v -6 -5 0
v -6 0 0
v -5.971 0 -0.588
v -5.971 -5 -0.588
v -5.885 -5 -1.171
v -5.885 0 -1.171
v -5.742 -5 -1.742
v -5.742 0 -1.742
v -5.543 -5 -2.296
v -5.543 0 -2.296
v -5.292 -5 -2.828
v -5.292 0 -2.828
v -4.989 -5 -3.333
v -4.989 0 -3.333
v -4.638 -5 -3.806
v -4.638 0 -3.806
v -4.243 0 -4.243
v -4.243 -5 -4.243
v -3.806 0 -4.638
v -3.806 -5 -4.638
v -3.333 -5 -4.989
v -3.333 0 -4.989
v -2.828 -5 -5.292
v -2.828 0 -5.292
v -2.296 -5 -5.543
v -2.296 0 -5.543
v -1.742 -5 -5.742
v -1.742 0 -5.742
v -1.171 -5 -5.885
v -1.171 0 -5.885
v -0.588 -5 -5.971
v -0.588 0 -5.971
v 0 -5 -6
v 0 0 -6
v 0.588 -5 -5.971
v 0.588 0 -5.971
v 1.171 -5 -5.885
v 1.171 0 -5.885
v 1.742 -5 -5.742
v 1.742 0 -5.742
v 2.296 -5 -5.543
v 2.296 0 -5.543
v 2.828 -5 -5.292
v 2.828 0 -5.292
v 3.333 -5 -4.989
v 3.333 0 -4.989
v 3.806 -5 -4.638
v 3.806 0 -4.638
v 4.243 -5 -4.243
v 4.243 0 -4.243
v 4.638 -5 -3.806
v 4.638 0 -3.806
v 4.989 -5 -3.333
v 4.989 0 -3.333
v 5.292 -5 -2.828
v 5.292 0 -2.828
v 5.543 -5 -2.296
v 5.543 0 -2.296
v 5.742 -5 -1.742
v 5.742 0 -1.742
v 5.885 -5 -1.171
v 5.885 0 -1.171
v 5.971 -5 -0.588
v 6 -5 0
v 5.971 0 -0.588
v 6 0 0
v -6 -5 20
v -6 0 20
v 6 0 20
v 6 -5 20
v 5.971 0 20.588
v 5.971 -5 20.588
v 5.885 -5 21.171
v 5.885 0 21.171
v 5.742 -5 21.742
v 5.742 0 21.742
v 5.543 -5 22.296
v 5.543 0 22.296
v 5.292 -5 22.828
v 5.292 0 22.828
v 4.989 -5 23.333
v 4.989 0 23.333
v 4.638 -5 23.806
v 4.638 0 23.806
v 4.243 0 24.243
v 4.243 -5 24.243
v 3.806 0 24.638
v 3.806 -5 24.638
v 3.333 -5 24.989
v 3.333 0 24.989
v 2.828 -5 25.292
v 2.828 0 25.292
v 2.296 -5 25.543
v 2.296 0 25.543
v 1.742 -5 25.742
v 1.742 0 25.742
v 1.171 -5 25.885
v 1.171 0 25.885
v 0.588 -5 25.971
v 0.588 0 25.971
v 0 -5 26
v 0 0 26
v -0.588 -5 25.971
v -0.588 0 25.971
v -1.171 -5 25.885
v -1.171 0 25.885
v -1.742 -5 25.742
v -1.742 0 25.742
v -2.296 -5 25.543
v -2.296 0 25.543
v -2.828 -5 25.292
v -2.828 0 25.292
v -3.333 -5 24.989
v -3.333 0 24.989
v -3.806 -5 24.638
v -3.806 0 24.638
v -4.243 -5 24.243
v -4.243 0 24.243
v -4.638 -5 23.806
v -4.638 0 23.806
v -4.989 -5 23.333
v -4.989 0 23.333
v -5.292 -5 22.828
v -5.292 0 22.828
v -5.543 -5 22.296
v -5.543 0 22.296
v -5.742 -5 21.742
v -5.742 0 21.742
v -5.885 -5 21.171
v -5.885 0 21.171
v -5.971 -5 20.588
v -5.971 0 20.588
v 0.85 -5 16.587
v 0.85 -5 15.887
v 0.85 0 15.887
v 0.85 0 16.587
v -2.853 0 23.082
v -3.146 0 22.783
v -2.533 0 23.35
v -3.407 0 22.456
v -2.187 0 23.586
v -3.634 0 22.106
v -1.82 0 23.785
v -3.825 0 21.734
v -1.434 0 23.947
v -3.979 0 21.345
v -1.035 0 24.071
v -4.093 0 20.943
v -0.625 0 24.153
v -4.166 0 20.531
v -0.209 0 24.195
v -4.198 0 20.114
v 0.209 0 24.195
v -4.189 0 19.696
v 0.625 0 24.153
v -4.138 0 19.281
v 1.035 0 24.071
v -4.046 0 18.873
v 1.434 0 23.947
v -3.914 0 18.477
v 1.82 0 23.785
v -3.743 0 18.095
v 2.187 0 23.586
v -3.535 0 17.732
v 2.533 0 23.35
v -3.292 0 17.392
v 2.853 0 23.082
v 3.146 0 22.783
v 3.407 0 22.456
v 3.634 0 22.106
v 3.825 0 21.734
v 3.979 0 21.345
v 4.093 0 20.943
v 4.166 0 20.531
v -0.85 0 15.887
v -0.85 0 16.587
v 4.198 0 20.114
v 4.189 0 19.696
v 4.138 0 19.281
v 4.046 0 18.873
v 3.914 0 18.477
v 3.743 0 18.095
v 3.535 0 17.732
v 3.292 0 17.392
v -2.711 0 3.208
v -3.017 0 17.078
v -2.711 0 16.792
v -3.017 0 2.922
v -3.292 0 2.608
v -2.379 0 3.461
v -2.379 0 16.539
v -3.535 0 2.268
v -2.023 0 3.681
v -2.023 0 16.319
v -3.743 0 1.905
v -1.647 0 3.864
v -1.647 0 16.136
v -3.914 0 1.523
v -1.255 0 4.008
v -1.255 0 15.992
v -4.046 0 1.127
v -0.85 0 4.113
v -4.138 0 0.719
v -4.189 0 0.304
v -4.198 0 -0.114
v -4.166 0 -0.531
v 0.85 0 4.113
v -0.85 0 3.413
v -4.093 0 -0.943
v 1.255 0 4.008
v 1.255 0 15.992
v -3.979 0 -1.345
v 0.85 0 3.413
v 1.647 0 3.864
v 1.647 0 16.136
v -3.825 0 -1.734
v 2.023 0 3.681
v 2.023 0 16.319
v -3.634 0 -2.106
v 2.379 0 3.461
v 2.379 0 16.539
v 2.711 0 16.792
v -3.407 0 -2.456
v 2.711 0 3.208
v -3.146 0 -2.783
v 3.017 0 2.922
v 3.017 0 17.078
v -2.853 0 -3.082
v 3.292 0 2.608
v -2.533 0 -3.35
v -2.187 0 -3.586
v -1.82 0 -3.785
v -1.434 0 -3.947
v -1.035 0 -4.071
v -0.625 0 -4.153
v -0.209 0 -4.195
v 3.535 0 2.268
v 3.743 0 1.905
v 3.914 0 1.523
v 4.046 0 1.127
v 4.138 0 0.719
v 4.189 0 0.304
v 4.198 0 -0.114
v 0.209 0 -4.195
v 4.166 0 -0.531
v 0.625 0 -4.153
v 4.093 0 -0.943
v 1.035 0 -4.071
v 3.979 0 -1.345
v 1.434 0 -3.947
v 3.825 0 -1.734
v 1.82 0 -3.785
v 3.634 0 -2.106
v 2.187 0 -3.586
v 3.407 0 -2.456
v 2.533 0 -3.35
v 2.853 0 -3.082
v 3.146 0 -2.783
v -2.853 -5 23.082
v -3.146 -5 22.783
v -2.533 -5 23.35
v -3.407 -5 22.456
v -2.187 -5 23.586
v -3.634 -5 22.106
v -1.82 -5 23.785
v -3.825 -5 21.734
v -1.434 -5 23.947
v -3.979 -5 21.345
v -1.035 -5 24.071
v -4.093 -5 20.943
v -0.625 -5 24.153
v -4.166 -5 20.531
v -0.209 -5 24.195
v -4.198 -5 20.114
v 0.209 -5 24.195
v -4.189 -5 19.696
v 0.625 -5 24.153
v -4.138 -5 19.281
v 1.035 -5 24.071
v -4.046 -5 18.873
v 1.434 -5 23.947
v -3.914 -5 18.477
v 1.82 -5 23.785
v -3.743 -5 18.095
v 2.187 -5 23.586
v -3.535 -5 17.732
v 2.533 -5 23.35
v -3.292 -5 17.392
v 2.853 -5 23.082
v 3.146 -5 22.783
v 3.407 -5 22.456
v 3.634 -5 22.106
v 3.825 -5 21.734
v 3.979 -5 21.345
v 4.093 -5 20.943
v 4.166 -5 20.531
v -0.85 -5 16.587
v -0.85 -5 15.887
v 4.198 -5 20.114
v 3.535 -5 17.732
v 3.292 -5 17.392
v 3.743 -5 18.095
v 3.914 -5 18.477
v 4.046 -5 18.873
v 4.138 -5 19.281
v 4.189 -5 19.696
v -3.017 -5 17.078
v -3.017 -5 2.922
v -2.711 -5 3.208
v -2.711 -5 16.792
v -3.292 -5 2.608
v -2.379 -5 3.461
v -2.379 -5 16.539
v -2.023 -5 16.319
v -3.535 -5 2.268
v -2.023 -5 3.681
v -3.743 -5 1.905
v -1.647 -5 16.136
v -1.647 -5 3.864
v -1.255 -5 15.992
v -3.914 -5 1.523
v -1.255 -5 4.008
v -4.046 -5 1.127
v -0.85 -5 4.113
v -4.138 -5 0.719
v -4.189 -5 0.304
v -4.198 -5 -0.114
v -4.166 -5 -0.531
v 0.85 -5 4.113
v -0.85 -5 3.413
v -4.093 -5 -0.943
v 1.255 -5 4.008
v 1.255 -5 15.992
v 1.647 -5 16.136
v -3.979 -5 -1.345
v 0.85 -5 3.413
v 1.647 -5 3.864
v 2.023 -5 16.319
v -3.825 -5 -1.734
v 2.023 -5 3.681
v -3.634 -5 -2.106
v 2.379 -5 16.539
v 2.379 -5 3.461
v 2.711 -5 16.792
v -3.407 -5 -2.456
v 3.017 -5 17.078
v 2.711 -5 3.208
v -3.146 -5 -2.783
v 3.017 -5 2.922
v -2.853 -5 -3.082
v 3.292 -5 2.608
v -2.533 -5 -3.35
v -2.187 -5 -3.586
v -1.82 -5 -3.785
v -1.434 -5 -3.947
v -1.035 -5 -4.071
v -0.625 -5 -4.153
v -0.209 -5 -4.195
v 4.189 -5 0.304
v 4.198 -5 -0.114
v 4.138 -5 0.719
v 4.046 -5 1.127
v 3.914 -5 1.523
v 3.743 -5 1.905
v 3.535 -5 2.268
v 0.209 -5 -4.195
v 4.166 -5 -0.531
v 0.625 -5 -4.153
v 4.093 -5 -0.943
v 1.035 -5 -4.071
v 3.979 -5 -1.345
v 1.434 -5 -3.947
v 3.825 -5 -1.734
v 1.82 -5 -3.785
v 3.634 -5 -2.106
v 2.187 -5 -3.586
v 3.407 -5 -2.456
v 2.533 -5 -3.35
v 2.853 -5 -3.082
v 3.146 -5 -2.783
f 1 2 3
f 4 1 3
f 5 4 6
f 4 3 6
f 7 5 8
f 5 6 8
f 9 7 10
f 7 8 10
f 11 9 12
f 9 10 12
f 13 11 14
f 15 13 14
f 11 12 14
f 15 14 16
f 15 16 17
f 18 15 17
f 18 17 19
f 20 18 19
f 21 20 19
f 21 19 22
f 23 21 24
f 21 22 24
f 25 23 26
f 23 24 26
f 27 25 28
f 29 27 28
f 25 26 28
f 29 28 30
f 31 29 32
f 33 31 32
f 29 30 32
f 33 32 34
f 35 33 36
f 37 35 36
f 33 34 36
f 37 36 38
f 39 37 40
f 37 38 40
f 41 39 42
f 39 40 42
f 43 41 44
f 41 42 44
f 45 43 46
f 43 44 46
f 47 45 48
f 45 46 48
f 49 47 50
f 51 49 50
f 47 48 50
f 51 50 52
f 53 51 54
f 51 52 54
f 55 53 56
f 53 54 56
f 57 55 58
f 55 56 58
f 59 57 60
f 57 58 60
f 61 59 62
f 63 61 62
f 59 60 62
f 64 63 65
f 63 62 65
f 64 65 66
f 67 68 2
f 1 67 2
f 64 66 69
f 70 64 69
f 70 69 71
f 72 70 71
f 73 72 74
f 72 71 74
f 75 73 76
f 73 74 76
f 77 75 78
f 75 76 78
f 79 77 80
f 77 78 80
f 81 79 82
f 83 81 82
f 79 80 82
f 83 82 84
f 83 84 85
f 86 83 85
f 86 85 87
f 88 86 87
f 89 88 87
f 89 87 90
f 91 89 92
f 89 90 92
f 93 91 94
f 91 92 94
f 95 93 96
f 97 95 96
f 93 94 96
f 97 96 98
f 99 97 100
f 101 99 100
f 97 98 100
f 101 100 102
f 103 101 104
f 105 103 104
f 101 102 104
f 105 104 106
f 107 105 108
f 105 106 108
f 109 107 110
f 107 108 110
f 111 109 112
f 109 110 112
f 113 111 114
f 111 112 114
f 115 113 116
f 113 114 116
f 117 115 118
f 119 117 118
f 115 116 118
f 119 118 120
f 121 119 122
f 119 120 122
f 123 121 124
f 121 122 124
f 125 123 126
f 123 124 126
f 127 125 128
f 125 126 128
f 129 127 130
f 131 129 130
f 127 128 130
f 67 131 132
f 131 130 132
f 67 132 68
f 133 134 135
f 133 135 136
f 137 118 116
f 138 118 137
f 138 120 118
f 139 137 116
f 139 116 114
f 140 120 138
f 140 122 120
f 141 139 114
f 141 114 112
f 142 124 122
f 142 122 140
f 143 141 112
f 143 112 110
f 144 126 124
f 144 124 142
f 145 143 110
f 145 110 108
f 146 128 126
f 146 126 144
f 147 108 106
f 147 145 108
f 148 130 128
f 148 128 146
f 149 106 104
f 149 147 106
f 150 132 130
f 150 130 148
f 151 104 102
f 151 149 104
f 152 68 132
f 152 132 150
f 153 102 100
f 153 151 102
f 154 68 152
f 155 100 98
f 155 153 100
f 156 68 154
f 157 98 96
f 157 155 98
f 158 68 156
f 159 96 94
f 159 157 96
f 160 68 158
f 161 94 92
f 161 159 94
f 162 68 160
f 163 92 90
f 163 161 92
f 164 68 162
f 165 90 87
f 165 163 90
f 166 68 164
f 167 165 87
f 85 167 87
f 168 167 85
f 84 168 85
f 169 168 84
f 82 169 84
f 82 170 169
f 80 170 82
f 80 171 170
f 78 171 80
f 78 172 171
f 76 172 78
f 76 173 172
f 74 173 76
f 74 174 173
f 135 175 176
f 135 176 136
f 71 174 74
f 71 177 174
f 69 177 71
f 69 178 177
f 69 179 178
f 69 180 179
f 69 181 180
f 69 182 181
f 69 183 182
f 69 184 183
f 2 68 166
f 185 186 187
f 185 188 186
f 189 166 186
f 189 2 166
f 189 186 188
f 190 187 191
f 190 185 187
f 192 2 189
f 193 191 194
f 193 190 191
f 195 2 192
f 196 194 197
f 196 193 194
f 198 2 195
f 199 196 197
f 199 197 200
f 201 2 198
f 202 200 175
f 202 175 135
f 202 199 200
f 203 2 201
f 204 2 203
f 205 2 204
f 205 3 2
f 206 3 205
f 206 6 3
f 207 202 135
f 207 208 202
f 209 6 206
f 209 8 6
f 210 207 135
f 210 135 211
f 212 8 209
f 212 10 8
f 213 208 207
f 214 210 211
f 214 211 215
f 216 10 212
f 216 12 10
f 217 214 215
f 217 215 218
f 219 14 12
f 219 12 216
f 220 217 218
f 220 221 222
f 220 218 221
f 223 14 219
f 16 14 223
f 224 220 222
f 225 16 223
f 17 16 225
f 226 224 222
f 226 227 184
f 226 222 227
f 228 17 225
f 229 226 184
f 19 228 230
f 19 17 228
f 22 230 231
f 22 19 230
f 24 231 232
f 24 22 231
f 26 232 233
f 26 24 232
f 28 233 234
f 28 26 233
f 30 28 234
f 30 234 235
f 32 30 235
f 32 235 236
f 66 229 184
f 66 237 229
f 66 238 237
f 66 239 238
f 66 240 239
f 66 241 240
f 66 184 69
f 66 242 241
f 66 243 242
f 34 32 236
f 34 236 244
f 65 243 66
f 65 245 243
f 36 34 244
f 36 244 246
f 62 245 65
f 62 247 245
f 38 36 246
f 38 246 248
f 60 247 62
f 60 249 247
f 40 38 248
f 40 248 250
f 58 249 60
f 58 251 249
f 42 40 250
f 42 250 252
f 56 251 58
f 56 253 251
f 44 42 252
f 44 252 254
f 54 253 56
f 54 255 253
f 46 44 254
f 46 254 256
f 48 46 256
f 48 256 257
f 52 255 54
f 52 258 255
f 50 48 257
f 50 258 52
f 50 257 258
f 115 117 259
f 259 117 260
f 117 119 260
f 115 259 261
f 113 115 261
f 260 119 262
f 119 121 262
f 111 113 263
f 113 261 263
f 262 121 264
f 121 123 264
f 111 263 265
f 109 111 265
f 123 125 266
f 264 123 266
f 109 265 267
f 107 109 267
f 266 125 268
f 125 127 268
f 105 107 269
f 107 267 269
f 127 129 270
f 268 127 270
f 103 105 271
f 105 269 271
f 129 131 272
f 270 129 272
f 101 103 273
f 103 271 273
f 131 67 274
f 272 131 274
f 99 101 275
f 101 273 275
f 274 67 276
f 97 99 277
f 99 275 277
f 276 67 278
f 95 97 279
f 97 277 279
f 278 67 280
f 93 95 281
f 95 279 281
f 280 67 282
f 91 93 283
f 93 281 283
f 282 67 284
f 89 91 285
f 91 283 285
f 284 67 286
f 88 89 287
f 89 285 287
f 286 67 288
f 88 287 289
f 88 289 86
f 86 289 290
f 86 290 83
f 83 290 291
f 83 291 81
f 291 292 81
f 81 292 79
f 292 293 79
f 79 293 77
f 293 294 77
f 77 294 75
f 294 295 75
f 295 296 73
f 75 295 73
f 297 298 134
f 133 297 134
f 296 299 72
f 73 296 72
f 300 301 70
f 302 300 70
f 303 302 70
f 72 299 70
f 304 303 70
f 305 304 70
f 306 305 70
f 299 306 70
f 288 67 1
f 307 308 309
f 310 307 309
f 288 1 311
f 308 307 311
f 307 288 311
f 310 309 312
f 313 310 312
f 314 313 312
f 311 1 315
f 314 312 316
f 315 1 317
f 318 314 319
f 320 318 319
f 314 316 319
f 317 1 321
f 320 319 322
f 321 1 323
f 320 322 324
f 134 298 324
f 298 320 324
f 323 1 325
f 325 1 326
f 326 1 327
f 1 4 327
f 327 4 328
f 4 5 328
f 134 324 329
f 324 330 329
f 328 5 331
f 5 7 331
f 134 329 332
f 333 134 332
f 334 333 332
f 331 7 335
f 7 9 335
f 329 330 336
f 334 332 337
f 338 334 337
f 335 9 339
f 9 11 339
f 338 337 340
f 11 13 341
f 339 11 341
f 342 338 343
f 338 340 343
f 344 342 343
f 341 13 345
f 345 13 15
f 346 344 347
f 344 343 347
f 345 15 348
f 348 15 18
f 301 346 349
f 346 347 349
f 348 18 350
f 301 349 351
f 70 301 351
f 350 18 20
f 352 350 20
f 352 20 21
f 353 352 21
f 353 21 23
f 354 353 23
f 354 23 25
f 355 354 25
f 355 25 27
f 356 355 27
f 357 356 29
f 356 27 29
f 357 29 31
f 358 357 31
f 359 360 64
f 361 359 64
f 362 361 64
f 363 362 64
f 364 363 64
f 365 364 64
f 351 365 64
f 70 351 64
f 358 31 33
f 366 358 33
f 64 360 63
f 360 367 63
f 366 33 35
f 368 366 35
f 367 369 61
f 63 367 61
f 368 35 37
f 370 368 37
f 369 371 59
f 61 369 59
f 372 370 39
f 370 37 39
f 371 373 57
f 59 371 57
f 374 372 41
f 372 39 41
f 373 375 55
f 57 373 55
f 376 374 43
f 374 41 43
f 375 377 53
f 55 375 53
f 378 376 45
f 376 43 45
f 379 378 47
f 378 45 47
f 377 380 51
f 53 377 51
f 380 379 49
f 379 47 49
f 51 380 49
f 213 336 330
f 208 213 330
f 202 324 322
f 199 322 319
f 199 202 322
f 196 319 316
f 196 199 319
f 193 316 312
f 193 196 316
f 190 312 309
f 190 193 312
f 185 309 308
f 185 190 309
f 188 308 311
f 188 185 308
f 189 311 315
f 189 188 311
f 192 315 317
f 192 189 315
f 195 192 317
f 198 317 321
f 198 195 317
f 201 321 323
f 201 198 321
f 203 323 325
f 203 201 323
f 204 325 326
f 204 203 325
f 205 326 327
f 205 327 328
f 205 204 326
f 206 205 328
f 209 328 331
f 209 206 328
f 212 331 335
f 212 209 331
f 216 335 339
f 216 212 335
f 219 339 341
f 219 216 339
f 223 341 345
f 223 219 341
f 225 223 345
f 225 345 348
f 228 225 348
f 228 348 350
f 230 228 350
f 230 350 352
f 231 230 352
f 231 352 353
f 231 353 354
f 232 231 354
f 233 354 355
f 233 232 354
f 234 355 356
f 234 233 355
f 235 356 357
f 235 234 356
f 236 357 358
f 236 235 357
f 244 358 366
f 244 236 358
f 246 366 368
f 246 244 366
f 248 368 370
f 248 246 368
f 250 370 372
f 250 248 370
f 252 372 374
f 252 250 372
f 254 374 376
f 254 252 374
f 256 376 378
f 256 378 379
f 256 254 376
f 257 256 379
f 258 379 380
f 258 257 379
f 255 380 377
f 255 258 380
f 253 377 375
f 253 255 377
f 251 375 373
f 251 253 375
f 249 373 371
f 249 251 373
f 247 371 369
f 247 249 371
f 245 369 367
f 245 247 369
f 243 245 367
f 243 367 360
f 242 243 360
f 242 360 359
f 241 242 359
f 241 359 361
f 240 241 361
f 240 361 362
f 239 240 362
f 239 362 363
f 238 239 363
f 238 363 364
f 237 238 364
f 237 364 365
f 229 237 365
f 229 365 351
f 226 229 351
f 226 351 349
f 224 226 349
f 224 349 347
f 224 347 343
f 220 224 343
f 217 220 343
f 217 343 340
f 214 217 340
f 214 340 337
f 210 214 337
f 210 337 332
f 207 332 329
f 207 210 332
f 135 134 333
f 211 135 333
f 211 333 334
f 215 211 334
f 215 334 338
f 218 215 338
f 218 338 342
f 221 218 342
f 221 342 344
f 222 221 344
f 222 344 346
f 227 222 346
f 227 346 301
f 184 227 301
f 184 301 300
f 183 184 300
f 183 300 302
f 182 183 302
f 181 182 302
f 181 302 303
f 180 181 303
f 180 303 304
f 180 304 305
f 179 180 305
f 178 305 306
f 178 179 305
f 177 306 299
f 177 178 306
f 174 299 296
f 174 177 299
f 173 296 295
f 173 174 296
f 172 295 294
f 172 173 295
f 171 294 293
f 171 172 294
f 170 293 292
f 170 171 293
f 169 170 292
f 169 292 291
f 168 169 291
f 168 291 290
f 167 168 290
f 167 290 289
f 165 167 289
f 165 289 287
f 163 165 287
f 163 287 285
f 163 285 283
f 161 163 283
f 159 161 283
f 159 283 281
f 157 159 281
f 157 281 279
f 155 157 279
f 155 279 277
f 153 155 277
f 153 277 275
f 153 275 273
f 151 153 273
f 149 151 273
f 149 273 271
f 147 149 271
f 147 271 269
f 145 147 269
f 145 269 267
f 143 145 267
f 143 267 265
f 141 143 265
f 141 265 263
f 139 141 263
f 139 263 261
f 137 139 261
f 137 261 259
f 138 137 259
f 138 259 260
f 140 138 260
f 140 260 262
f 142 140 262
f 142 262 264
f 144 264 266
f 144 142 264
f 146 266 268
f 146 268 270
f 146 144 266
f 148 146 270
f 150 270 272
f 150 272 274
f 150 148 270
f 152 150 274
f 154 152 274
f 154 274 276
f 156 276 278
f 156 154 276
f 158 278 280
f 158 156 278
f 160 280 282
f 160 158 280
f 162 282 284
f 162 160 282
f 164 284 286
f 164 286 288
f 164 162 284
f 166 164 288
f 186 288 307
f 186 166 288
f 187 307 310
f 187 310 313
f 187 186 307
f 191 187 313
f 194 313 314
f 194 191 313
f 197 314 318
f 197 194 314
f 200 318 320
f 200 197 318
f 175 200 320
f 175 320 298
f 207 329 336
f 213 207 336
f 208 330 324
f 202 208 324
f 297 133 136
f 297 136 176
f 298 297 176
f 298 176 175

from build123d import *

# Parameters (mm, degrees)
F0_R     = 4.2
F1_DEPTH = 5
F3_DEPTH = 5


# Not quite as in the source:
# - a pattern or mirror of a feature is missing from the dataset's text; its kind, count and spacing are read off the source's solid


with BuildPart() as f1:
    # F0 (on Front) → F1 (new body)
    with BuildSketch(Plane.XZ):
        with BuildLine():
            Line((-6, 20), (-6, 0))
            ThreePointArc((-6, 0), (0, -6), (6, 0))
            Line((6, 0), (6, 20))
            ThreePointArc((6, 20), (0, 26), (-6, 20))
        make_face()
        Circle(F0_R, mode=Mode.SUBTRACT)
        with Locations((0, 20)):
            Circle(F0_R, mode=Mode.SUBTRACT)
    extrude(amount=F1_DEPTH)

    # F2 (on face) → F3 (join, through all)
    with BuildSketch(Plane.XZ.offset(5)):
        Polygon((-0.85, 16.5869111364), (-0.85, 15.8869111364), (0, 14.8420017213), (0.85, 15.8869111364), (0.85, 16.5869111364), align=None)
    f3 = extrude(amount=-F3_DEPTH)

    # F3_copies: F3 across plane
    add(f3.mirror(Plane(origin=(0, 0, 10), x_dir=(-1, 0, 0), z_dir=(0, 0, -1))))


solid = f1.part
